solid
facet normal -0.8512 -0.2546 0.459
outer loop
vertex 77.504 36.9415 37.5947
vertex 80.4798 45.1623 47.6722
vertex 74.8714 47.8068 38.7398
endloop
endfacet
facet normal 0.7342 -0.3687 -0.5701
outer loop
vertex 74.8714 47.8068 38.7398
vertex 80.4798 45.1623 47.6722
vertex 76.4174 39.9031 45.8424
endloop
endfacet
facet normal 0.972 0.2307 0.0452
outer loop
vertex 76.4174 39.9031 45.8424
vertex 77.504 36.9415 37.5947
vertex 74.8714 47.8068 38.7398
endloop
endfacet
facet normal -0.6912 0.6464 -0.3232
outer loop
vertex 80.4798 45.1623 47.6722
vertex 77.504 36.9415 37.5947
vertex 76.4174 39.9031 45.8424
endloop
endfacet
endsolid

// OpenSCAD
// Auto-generated auxetic polyhedron
points = [
    [74.871415, 47.806840, 38.739770],
    [80.479823, 45.162342, 47.672247],
    [77.503985, 36.941489, 37.594650],
    [76.417421, 39.903076, 45.842375],
];

faces = [
    [0, 1, 2],
    [3, 1, 0],
    [0, 2, 3],
    [3, 2, 1],
];

polyhedron(points = points, faces = faces);
